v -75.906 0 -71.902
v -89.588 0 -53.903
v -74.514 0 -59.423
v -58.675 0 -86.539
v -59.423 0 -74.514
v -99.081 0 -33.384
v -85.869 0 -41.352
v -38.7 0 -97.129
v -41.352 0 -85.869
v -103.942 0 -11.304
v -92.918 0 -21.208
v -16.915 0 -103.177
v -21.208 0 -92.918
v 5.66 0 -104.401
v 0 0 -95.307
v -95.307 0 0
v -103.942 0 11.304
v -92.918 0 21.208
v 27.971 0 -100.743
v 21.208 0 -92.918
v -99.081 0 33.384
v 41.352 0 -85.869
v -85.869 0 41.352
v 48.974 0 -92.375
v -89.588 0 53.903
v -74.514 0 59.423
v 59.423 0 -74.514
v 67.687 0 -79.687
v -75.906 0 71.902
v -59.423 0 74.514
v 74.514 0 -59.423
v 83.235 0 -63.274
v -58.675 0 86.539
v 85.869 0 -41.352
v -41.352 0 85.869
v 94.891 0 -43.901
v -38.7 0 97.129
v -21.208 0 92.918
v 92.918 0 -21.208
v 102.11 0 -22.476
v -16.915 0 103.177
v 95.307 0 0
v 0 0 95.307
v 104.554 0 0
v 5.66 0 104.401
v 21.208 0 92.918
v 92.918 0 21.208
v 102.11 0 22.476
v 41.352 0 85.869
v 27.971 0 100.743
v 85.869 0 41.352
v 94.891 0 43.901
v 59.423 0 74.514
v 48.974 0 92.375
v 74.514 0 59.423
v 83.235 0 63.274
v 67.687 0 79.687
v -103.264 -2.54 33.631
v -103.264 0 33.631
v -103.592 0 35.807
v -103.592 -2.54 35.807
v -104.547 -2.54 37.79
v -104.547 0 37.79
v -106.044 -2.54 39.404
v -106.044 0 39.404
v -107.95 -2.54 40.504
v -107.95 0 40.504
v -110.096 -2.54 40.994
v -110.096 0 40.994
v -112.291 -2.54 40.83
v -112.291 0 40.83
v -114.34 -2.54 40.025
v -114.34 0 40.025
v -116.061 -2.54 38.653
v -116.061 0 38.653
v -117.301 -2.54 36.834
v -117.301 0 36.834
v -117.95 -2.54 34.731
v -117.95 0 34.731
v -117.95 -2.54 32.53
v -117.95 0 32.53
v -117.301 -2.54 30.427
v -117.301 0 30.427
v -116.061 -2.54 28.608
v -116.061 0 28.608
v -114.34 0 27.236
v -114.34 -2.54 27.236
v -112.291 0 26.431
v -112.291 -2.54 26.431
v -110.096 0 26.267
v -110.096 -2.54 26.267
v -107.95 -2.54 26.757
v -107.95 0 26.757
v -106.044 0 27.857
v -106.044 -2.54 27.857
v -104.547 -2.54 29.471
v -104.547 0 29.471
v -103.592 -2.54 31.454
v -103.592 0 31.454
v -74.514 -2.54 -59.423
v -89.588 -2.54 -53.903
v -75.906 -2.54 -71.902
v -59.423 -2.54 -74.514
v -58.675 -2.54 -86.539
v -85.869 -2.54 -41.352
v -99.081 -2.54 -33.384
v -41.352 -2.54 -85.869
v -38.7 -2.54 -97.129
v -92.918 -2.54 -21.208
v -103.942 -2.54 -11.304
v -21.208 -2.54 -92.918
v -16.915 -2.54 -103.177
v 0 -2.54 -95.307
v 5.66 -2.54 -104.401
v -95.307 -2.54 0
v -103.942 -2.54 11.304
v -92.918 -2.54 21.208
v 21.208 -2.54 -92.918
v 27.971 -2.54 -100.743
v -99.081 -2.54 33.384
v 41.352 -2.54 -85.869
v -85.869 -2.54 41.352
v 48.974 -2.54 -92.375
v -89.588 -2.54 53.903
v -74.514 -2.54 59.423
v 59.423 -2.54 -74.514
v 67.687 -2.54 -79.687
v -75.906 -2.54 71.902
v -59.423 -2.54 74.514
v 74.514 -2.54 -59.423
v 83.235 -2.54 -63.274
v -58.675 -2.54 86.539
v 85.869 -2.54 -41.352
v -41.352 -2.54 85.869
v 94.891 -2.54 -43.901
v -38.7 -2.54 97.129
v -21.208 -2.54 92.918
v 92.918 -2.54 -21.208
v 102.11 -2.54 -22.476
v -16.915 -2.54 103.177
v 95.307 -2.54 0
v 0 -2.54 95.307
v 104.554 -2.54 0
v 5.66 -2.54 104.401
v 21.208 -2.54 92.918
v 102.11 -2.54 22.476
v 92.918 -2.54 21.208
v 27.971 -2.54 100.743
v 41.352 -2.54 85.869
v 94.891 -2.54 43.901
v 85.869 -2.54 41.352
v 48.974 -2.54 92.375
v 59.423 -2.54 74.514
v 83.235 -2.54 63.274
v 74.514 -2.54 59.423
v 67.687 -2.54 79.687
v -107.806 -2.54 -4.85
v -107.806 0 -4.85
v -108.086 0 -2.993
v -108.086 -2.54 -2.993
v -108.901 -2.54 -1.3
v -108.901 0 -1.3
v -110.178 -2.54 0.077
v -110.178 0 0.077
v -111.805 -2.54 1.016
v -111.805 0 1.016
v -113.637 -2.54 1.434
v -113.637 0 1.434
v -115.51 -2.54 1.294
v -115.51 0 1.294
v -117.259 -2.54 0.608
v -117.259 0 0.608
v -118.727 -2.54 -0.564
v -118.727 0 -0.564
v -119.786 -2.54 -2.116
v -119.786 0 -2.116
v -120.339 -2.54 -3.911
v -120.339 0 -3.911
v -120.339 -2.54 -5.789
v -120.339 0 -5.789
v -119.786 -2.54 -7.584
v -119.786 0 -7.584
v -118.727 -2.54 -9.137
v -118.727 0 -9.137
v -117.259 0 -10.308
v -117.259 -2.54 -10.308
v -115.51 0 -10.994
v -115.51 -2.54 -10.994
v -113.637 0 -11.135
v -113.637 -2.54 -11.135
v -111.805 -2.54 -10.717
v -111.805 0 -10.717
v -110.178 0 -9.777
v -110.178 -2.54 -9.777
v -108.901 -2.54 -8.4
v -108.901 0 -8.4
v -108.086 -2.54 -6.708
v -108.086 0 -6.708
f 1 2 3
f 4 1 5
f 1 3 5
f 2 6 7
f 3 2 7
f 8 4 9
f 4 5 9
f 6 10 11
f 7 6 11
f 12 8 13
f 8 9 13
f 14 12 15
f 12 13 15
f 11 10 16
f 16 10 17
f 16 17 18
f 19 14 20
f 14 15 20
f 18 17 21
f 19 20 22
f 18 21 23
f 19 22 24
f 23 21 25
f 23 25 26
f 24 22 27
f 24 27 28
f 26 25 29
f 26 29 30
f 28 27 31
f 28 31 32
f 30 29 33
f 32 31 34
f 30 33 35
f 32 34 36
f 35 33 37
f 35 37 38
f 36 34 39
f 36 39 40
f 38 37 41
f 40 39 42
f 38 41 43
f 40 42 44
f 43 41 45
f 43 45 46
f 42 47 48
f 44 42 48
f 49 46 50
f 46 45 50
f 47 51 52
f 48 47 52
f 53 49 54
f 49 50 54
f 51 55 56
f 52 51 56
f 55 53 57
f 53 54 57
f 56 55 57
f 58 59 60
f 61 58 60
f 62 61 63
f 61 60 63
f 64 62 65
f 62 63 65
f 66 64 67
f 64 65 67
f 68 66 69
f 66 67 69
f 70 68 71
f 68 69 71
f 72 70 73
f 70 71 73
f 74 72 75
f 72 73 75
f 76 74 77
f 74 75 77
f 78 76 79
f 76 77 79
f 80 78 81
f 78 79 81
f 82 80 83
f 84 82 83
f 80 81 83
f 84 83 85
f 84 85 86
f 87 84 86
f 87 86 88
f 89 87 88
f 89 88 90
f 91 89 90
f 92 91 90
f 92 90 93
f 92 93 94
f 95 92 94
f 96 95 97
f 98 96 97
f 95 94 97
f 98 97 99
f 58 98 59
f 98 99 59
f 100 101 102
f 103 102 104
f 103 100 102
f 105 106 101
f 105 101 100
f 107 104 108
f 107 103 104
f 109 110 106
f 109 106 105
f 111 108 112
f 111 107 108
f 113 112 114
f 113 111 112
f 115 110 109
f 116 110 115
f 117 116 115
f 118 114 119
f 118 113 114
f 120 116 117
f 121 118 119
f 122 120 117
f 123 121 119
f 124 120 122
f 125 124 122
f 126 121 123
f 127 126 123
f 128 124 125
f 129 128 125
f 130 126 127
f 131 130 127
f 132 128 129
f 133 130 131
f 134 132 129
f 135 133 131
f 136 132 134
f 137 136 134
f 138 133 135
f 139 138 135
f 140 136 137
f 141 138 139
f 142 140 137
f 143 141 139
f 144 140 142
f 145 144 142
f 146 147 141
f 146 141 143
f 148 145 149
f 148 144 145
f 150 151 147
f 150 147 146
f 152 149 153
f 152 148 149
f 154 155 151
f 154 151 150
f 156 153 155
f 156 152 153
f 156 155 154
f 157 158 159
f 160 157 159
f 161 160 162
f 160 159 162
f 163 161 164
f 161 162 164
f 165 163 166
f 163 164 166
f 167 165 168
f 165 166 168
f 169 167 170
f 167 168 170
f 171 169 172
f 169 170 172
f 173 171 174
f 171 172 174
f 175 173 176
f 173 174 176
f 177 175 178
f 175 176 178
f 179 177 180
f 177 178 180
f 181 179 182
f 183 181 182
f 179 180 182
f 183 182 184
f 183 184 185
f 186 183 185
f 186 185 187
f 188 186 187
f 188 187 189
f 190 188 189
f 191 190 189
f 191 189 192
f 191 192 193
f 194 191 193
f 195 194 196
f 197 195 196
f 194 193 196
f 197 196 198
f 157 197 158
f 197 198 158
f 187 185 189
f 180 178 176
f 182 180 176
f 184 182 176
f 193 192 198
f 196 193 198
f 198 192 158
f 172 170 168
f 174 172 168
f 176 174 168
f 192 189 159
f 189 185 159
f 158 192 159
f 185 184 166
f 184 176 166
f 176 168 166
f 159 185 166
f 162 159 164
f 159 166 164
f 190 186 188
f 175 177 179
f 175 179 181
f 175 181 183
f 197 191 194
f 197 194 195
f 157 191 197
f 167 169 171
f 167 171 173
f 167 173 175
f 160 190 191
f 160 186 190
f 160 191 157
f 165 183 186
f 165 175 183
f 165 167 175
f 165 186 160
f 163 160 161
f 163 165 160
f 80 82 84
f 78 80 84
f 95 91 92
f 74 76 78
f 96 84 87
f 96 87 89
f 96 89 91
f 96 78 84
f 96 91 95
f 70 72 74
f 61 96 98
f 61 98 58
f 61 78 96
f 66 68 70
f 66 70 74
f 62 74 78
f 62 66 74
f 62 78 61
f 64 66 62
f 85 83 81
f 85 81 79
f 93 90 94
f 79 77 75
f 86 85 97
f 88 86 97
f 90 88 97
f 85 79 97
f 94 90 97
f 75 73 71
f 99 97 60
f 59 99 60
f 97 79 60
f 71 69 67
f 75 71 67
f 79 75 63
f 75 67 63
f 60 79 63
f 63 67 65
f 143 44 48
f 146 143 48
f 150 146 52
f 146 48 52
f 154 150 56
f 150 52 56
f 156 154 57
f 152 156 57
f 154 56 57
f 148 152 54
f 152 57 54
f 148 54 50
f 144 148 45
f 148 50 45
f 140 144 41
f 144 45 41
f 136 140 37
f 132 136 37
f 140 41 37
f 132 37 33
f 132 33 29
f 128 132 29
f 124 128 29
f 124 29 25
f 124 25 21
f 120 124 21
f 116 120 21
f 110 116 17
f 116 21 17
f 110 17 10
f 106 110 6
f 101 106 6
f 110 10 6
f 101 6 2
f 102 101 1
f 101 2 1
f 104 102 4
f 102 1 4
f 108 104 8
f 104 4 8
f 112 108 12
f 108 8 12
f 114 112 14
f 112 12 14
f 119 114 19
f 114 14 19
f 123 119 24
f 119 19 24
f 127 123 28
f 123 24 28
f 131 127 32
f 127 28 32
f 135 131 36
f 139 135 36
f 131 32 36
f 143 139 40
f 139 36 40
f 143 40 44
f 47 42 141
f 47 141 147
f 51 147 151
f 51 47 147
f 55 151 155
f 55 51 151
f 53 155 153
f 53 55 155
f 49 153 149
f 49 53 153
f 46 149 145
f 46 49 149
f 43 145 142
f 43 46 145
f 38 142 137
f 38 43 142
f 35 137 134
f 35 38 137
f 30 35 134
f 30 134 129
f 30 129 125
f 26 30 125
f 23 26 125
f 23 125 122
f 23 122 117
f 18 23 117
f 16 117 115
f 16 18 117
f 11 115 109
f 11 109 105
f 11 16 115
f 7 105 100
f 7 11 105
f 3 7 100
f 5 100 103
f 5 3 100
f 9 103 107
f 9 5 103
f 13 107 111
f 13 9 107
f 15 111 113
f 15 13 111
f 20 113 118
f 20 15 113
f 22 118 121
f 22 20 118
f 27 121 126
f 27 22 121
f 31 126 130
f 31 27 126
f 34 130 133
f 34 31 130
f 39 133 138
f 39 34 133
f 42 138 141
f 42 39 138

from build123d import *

# Parameters (mm, degrees)
F0_R     = 104.5544645938
F0_R_2   = 95.3072985624
F1_DEPTH = 2.54
F3_R     = 7.3841898205
F4_DEPTH = 2.54
F3_R_2   = 6.30202013
F5_DEPTH = 2.54


# Not quite as in the source:
# - the program builds the solid bodies; features that only make, move or delete a surface that nothing else refers to are left out


with BuildPart() as f1:
    # F0 (on Front) → F1 (new body)
    with BuildSketch(Plane.XZ):
        Circle(F0_R)
        Circle(F0_R_2, mode=Mode.SUBTRACT)
    extrude(amount=F1_DEPTH)


with BuildPart() as f4:
    # F3 (on Front) → F4 (new body)
    with BuildSketch(Plane.XZ):
        with Locations((-110.6478646398, 33.6305089295)):
            Circle(F3_R)
    extrude(amount=F4_DEPTH)


with BuildPart() as f5:
    # F3 (on Front) → F5 (new body)
    with BuildSketch(Plane.XZ):
        with Locations((-114.1076162457, -4.850124009)):
            Circle(F3_R_2)
    extrude(amount=F5_DEPTH)


solid = Compound([f1.part, f4.part, f5.part])
